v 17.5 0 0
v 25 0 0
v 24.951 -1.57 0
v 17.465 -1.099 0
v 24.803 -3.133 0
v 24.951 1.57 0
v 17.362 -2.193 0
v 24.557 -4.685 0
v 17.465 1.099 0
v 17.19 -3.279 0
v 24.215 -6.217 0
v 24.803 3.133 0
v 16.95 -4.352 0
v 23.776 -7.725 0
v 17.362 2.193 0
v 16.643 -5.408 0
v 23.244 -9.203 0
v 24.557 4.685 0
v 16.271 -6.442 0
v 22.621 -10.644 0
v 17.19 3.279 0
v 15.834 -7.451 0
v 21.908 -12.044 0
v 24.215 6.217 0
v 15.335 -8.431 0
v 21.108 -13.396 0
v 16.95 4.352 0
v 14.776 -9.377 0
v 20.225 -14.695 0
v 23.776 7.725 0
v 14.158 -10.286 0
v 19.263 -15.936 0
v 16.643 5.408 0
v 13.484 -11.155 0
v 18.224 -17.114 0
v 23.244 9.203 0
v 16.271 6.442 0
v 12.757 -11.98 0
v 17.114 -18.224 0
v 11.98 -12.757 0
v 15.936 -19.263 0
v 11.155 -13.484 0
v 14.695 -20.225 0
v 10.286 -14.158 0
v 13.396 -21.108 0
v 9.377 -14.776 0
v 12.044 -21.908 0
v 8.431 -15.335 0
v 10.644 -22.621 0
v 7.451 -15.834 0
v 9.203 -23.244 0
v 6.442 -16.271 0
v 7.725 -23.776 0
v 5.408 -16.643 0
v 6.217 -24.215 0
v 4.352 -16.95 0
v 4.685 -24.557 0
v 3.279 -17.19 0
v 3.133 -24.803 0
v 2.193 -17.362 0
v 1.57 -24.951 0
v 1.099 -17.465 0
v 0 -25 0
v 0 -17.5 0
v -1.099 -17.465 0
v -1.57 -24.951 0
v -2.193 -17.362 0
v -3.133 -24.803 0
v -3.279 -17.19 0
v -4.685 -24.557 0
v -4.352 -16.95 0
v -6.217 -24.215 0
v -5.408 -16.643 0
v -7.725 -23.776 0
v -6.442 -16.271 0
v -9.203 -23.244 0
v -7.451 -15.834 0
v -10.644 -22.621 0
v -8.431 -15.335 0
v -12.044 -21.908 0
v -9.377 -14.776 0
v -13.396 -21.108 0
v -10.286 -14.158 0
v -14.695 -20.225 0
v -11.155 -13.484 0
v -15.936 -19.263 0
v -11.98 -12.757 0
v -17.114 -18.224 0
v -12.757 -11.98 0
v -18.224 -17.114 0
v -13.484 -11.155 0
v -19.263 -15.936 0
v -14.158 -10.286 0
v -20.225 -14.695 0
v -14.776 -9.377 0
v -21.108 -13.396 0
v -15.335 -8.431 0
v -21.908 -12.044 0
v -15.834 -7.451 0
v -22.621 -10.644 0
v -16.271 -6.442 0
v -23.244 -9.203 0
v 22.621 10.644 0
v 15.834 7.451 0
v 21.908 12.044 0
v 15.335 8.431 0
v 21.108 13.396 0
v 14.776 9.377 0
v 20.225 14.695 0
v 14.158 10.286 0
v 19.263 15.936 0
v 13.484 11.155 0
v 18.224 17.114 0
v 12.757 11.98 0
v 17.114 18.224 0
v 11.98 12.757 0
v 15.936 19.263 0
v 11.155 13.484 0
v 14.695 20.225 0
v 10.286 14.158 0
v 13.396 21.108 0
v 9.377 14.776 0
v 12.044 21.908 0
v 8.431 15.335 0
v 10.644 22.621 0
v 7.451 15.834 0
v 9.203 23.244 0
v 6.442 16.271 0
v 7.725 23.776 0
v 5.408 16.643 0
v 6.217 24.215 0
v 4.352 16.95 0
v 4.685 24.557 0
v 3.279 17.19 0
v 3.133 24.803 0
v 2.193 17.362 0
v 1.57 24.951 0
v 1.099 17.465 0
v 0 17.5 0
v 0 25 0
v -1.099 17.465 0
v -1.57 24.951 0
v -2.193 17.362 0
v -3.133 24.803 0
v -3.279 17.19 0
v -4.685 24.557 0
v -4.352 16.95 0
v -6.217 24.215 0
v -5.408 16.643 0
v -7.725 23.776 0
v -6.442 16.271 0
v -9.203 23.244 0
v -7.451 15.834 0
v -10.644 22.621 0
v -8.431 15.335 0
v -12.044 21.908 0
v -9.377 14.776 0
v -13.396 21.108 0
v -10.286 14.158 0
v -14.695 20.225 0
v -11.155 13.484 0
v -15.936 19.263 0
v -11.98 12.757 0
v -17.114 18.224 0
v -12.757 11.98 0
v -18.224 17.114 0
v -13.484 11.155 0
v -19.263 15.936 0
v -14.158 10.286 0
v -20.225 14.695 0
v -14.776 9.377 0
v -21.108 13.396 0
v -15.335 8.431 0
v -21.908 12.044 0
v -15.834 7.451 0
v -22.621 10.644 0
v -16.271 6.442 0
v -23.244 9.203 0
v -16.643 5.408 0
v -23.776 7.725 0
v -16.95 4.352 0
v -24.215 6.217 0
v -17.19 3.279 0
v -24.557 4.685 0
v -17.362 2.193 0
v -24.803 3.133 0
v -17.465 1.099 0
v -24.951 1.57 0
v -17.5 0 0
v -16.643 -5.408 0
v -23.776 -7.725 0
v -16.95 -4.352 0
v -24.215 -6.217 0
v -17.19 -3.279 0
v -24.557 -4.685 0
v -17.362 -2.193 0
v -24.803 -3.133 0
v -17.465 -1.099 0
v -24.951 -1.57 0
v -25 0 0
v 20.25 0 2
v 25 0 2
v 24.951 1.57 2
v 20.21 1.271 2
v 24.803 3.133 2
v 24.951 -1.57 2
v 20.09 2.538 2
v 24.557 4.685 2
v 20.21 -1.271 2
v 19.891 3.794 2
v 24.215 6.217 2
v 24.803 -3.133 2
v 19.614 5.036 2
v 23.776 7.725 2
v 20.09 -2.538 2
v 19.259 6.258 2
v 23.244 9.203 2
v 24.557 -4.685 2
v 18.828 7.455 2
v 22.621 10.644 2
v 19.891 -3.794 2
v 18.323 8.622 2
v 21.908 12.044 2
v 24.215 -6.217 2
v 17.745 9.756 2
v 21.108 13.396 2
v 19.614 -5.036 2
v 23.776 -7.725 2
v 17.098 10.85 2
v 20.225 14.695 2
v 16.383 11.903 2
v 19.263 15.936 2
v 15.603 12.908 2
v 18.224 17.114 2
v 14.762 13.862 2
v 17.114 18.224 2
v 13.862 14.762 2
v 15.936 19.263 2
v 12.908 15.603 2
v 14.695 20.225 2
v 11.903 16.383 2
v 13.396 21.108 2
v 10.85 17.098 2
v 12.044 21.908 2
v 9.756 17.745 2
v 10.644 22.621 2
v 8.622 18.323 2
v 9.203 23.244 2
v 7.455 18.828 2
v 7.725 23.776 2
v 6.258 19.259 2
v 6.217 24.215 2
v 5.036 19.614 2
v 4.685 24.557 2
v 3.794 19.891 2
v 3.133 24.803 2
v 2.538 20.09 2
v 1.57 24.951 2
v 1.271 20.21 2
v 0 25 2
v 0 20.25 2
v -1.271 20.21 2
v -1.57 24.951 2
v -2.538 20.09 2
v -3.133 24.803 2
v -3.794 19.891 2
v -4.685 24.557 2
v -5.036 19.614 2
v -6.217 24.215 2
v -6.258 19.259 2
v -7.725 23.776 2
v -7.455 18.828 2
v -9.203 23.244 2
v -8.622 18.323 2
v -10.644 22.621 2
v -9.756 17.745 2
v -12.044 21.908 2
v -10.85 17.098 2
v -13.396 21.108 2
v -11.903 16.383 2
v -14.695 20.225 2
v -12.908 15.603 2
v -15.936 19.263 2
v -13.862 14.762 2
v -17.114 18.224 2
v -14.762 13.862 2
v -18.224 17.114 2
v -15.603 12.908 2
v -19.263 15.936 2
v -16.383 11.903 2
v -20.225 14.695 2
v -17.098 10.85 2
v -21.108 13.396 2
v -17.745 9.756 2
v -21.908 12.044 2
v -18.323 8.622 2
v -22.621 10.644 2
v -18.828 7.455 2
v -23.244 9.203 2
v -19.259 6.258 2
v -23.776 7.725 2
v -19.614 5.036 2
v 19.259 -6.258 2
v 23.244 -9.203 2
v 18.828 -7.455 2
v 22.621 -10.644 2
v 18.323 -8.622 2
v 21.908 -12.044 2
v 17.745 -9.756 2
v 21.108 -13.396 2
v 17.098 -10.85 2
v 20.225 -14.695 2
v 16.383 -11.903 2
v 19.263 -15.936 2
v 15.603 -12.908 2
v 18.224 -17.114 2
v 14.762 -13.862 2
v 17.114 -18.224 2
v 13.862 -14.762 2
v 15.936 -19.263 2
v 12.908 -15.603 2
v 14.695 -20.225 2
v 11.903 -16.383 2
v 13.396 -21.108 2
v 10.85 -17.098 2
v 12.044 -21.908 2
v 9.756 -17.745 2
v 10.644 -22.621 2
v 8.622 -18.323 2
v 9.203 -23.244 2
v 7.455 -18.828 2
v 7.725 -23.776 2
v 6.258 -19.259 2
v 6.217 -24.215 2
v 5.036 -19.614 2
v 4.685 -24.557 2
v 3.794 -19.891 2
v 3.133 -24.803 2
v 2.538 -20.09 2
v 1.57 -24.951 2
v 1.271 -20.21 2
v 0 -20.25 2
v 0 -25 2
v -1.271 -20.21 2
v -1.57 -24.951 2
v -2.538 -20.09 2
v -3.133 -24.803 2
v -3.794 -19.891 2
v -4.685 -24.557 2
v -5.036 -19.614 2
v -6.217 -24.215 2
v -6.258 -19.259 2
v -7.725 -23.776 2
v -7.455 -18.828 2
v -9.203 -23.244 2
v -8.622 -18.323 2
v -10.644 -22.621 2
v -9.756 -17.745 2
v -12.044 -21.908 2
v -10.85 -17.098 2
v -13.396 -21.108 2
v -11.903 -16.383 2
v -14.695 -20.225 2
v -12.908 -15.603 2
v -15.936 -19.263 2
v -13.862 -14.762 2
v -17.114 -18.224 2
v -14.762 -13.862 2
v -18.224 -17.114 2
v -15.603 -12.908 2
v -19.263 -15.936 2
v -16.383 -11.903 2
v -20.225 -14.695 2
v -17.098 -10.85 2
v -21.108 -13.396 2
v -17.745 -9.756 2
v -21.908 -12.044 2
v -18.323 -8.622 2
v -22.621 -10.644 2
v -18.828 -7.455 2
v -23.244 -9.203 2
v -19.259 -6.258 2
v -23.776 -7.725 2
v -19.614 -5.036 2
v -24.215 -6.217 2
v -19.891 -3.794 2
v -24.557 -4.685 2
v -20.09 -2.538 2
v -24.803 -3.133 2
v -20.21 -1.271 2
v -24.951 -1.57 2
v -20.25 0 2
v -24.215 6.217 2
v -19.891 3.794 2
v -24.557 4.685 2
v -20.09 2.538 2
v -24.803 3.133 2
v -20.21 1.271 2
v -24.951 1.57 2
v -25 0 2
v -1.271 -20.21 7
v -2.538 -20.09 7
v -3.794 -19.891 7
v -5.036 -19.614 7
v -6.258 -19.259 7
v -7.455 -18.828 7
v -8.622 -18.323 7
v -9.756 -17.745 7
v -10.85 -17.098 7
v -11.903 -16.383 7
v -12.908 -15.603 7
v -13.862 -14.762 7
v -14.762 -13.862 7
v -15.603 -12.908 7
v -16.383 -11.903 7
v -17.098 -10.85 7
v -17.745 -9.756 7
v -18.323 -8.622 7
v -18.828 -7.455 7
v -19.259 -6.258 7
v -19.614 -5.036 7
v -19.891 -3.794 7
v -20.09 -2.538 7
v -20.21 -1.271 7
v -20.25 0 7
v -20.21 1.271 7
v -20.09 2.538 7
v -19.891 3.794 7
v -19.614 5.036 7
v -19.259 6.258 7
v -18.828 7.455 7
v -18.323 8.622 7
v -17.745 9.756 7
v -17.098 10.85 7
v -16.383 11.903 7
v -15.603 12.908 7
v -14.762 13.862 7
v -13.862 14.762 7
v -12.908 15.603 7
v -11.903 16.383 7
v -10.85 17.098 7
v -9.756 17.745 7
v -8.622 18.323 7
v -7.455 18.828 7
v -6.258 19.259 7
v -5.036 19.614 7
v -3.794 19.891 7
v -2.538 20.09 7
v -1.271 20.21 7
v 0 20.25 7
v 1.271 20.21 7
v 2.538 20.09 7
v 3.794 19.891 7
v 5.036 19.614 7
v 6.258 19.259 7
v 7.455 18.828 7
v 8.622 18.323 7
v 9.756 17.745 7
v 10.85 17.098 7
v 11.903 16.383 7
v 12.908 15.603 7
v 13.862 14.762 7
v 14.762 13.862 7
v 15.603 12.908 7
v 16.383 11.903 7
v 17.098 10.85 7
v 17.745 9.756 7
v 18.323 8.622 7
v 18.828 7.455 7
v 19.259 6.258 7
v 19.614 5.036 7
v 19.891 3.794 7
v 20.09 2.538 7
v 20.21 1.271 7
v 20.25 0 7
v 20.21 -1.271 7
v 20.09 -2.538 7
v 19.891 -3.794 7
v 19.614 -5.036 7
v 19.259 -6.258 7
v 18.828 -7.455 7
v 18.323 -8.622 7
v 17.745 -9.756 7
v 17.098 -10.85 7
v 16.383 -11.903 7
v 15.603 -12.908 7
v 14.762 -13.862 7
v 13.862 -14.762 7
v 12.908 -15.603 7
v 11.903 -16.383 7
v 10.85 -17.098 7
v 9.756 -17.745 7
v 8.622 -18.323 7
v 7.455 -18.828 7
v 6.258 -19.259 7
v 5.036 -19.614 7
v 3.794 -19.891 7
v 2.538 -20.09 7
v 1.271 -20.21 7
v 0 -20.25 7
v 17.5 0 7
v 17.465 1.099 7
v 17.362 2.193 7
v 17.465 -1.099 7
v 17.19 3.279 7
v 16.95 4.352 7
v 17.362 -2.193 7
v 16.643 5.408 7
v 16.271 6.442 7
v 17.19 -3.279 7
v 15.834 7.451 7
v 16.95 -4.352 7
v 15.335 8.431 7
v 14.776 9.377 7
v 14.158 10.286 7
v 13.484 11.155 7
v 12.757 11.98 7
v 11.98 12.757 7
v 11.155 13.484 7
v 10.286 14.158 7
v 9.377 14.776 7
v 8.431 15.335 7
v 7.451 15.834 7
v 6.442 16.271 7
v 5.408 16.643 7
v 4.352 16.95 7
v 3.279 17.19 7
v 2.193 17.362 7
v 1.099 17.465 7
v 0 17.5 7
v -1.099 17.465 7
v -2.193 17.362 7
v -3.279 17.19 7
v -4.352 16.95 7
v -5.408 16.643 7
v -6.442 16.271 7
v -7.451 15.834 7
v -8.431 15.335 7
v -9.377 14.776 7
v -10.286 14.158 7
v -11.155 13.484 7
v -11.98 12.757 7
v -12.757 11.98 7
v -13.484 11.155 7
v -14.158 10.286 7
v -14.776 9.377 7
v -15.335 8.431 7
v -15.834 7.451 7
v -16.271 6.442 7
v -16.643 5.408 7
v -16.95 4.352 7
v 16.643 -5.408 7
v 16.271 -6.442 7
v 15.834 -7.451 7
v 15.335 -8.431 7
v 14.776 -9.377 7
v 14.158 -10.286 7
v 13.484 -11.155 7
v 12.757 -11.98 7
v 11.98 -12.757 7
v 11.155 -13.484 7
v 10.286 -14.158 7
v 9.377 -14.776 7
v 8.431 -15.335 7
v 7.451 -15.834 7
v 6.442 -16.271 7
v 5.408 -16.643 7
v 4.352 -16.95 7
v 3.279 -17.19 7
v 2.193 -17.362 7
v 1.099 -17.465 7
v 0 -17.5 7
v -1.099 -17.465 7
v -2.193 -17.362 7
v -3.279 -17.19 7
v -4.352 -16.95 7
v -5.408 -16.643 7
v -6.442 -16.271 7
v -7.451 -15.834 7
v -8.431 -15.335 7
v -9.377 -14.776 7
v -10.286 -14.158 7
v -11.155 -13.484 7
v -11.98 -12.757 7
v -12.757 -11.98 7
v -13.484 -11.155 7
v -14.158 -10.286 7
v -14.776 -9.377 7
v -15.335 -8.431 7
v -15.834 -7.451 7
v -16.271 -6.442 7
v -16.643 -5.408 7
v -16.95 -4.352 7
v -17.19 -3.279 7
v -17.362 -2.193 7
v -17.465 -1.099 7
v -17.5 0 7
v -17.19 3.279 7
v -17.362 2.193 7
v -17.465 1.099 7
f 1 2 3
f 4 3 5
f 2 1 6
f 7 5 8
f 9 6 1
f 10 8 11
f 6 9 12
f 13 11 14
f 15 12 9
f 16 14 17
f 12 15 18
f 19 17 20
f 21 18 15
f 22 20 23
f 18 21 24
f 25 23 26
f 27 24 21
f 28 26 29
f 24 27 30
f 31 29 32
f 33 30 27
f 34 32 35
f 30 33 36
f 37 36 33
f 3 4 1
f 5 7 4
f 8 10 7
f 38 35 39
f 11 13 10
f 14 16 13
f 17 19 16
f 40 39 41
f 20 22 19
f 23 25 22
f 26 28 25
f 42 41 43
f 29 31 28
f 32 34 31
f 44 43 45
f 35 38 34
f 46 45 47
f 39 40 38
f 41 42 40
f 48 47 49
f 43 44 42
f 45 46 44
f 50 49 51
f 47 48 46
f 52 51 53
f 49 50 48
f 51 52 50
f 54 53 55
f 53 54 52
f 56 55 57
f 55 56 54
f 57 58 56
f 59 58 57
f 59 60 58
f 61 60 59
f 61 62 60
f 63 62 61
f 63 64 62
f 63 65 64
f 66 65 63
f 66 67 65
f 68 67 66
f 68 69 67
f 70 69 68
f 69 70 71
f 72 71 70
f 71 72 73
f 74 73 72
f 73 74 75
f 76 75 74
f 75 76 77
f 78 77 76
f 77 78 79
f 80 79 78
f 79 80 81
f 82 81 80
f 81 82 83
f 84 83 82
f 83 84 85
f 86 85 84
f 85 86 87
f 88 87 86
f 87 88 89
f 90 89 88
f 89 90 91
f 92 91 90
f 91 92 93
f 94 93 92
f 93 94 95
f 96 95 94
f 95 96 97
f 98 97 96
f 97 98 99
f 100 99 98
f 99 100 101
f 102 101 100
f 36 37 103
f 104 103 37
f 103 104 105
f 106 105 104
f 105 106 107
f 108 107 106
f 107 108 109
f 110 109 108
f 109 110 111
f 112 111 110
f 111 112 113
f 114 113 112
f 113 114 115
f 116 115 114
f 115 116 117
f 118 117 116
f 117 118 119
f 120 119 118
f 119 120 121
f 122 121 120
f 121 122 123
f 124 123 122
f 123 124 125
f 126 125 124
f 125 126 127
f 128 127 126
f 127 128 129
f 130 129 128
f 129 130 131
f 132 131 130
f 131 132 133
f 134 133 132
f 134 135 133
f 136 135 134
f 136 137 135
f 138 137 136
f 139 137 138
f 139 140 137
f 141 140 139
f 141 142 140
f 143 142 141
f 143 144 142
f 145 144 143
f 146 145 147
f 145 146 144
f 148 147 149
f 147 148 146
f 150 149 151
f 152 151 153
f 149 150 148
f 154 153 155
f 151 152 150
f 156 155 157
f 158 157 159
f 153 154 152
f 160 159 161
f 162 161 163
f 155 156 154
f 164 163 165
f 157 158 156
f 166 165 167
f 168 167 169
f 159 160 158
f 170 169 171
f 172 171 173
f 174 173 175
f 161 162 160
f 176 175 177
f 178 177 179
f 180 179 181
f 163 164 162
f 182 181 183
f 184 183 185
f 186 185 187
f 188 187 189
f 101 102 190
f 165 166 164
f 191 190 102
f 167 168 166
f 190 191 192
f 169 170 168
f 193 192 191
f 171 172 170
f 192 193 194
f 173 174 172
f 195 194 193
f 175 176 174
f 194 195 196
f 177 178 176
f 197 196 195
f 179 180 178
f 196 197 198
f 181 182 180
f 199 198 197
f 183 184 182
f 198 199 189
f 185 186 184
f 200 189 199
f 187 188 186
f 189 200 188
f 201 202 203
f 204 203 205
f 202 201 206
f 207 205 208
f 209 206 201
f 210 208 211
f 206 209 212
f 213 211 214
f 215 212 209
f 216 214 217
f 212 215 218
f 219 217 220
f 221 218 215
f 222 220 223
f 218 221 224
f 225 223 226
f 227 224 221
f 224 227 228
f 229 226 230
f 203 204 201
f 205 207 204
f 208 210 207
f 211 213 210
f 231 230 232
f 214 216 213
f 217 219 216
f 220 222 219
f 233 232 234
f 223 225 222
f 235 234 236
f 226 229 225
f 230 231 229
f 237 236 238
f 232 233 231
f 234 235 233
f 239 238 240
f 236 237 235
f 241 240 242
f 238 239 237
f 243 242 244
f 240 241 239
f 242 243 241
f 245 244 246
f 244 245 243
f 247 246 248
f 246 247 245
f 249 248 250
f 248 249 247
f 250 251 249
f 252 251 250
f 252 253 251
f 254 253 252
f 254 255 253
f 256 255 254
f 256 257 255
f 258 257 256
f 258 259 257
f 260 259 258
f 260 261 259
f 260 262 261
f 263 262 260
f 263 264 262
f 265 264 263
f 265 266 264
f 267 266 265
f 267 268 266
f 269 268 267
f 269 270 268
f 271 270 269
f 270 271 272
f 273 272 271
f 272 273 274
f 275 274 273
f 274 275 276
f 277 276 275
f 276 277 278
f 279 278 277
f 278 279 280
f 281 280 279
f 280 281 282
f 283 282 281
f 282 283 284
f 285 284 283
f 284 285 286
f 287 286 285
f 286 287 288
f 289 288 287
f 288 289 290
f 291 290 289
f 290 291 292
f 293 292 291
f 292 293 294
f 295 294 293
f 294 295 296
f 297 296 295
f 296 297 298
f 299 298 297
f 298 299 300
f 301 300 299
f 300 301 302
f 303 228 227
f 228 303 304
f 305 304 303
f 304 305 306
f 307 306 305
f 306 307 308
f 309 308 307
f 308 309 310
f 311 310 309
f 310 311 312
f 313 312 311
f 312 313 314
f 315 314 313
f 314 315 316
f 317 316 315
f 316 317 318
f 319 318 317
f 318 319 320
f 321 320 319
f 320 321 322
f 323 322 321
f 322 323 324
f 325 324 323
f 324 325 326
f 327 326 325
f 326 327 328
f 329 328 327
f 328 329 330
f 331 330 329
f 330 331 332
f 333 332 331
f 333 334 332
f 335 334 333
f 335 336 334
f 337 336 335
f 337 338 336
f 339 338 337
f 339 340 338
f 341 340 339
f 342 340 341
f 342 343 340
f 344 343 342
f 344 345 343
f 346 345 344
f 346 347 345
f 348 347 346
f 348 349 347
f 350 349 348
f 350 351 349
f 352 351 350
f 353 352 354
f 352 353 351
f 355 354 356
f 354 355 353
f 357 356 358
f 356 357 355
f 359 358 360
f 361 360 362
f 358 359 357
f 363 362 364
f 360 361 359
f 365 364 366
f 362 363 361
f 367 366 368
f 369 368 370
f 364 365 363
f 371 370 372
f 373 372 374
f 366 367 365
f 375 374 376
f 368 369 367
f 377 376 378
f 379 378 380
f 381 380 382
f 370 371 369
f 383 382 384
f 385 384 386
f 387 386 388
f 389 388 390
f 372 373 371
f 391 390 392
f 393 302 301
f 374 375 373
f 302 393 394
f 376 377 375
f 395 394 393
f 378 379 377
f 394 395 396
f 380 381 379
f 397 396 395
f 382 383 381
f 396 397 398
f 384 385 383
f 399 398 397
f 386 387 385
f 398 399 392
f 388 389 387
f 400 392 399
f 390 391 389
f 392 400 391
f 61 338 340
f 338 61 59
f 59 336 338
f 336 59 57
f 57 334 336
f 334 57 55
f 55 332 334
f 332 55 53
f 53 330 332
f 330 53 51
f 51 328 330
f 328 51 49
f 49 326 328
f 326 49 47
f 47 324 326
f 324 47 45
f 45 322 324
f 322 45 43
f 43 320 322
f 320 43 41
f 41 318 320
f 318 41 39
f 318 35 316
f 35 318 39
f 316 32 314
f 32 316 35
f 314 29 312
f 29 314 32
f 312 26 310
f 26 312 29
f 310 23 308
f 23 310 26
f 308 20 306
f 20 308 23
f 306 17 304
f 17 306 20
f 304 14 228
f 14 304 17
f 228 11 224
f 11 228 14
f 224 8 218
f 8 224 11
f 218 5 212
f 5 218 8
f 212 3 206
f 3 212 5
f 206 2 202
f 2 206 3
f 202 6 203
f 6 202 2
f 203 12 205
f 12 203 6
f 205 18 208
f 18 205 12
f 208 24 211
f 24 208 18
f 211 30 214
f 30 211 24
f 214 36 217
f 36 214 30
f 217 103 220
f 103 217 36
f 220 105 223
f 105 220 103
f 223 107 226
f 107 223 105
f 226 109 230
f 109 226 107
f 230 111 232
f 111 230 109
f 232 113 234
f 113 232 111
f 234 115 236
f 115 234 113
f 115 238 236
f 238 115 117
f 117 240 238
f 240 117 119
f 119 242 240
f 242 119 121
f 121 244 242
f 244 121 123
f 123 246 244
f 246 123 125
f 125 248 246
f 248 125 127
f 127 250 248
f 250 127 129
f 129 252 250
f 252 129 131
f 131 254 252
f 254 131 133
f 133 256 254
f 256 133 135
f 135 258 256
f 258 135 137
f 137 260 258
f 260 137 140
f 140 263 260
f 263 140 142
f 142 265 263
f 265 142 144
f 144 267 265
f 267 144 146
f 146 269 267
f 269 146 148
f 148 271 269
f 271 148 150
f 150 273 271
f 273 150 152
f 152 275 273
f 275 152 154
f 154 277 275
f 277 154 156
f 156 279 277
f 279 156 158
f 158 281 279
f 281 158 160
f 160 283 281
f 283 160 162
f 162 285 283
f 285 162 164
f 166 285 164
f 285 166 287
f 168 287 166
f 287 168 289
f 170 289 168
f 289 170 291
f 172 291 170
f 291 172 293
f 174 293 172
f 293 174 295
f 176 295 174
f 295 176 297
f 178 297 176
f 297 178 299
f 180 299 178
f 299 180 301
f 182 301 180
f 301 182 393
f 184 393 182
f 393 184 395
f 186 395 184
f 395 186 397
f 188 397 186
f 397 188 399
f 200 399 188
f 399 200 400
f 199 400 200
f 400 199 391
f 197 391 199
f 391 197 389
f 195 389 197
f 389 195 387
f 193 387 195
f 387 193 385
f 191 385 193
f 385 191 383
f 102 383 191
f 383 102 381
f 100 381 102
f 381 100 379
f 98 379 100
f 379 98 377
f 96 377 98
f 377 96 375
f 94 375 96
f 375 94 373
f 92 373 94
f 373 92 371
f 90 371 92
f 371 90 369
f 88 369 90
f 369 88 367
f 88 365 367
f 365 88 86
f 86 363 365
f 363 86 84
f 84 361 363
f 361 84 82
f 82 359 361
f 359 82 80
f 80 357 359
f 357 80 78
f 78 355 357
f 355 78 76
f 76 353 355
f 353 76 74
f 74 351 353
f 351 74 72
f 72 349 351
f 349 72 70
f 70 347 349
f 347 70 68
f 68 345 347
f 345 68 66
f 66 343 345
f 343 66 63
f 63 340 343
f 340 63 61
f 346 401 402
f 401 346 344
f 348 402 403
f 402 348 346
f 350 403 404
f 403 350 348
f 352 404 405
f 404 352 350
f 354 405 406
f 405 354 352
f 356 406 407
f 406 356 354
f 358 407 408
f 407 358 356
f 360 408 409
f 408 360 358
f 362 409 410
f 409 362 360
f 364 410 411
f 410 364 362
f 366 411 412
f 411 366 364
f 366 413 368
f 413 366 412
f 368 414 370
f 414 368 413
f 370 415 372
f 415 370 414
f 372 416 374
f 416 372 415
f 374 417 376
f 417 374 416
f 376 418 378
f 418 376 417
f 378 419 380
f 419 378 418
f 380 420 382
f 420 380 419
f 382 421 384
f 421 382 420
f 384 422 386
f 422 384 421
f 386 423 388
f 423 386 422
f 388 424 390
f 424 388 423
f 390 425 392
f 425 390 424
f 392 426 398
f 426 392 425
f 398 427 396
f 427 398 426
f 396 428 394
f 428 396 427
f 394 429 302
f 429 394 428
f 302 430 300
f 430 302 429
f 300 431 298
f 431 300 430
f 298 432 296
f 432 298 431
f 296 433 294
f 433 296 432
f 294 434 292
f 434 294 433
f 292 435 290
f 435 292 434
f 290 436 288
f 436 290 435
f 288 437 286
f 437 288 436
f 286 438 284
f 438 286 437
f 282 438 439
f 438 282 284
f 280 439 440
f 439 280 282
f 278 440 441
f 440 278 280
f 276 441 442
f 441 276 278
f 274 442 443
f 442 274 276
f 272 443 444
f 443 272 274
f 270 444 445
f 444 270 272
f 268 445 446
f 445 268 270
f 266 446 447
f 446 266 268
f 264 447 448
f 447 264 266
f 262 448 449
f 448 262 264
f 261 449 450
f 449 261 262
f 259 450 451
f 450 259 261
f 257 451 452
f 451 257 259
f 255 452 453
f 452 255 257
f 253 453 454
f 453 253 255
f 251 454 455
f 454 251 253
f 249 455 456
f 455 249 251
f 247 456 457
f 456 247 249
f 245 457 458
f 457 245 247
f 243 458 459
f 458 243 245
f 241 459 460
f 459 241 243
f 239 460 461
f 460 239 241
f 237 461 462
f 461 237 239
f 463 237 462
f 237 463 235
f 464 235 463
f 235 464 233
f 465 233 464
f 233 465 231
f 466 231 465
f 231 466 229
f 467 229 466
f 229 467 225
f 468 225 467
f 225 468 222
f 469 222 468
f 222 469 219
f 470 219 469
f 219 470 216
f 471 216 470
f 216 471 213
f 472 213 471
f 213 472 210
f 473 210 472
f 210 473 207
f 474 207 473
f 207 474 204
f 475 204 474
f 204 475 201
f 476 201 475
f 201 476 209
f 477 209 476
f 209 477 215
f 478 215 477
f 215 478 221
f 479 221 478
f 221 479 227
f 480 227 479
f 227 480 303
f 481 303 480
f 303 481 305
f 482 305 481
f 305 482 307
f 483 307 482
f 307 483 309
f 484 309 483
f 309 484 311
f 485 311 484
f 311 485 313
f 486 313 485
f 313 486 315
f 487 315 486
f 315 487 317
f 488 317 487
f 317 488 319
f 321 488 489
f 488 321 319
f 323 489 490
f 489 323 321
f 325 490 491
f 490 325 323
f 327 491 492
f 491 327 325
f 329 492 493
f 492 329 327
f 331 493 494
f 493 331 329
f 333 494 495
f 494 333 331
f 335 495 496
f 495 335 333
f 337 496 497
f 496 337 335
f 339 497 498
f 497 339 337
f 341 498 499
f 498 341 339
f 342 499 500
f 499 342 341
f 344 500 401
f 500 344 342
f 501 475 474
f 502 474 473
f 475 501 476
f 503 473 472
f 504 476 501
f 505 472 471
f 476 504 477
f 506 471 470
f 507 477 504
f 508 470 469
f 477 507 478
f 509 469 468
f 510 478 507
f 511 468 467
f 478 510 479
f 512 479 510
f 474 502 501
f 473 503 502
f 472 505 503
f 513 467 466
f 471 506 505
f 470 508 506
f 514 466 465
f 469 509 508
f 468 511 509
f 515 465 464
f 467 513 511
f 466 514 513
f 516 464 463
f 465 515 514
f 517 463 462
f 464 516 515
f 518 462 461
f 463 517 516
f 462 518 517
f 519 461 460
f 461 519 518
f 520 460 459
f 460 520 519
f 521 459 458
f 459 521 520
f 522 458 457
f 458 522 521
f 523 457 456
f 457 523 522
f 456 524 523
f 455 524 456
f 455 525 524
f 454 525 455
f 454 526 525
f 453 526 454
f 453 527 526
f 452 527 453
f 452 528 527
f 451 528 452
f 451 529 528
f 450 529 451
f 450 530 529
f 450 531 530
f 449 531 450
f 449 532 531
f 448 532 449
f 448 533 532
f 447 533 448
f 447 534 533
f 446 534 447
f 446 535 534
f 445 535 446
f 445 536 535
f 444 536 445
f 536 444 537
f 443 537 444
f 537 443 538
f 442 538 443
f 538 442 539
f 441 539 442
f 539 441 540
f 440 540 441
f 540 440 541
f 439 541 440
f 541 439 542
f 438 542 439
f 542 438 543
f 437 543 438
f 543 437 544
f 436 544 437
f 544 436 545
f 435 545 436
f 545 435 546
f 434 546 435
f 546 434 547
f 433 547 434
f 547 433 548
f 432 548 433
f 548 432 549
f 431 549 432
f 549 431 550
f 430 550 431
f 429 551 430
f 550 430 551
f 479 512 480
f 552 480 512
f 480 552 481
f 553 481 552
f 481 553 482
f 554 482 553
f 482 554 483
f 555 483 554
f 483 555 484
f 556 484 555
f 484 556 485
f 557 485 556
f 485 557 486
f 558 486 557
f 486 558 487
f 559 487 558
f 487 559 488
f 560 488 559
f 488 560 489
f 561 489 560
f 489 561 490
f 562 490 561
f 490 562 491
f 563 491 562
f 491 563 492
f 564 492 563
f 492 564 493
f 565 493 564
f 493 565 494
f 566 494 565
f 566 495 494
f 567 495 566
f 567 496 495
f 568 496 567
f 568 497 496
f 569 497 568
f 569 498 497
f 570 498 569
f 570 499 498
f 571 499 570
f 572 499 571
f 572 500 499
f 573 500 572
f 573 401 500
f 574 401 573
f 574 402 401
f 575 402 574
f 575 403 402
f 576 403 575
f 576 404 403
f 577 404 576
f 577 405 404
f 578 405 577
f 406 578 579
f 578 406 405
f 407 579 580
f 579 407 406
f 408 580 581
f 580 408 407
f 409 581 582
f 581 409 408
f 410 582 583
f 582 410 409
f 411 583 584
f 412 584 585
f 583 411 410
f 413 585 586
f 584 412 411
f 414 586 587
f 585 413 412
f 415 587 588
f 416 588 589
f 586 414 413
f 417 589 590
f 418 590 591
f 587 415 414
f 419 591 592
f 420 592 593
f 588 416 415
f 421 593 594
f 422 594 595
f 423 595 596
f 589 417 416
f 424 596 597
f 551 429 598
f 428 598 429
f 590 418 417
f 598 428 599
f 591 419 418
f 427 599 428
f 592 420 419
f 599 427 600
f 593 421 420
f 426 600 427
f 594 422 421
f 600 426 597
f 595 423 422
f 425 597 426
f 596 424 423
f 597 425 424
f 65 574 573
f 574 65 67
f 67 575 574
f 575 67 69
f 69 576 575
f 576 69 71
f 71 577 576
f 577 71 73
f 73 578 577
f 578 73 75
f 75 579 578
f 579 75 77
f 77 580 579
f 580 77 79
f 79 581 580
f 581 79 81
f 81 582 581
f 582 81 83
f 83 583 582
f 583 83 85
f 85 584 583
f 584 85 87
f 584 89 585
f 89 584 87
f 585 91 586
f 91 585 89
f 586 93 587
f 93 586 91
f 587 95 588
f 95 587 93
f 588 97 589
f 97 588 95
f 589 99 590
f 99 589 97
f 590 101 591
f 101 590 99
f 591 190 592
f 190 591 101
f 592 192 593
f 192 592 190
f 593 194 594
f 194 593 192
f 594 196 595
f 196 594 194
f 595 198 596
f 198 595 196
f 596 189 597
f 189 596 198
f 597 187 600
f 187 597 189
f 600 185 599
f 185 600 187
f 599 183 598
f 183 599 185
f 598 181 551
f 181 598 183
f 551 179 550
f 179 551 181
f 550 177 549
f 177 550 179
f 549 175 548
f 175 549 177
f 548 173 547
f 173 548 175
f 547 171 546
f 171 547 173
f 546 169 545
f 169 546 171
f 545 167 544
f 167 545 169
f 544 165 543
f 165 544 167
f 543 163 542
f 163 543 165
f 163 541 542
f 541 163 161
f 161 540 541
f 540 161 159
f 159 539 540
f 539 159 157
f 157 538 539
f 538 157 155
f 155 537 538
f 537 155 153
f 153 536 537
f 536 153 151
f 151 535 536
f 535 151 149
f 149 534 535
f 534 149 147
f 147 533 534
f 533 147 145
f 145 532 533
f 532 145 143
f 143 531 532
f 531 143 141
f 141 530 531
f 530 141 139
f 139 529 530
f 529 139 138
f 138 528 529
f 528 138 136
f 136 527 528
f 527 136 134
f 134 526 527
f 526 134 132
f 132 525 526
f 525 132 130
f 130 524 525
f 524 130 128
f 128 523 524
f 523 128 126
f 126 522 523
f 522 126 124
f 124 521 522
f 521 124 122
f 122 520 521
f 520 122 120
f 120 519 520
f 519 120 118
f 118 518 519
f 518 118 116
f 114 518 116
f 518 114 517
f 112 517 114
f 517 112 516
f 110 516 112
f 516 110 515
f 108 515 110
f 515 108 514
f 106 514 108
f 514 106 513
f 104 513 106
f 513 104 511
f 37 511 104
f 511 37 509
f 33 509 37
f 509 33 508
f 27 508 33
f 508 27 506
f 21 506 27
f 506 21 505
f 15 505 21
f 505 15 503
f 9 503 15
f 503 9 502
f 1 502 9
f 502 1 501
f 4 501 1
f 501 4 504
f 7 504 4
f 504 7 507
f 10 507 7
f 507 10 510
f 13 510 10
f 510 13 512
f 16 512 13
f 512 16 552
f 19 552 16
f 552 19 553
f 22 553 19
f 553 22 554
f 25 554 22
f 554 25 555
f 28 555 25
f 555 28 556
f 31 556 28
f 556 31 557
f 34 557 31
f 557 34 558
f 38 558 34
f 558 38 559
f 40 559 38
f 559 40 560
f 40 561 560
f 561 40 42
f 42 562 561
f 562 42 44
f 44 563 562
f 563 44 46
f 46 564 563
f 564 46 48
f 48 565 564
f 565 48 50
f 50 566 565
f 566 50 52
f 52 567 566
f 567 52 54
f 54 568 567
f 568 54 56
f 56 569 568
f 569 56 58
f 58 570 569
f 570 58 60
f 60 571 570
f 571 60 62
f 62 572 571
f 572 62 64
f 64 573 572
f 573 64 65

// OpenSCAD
$fn=100;
width = 40.5;

linear_extrude(2)
difference() {    
    circle(d=50);
    circle(d=width);
}

linear_extrude(7)
difference() {
    circle(d=width);
    circle(d=35);
}
